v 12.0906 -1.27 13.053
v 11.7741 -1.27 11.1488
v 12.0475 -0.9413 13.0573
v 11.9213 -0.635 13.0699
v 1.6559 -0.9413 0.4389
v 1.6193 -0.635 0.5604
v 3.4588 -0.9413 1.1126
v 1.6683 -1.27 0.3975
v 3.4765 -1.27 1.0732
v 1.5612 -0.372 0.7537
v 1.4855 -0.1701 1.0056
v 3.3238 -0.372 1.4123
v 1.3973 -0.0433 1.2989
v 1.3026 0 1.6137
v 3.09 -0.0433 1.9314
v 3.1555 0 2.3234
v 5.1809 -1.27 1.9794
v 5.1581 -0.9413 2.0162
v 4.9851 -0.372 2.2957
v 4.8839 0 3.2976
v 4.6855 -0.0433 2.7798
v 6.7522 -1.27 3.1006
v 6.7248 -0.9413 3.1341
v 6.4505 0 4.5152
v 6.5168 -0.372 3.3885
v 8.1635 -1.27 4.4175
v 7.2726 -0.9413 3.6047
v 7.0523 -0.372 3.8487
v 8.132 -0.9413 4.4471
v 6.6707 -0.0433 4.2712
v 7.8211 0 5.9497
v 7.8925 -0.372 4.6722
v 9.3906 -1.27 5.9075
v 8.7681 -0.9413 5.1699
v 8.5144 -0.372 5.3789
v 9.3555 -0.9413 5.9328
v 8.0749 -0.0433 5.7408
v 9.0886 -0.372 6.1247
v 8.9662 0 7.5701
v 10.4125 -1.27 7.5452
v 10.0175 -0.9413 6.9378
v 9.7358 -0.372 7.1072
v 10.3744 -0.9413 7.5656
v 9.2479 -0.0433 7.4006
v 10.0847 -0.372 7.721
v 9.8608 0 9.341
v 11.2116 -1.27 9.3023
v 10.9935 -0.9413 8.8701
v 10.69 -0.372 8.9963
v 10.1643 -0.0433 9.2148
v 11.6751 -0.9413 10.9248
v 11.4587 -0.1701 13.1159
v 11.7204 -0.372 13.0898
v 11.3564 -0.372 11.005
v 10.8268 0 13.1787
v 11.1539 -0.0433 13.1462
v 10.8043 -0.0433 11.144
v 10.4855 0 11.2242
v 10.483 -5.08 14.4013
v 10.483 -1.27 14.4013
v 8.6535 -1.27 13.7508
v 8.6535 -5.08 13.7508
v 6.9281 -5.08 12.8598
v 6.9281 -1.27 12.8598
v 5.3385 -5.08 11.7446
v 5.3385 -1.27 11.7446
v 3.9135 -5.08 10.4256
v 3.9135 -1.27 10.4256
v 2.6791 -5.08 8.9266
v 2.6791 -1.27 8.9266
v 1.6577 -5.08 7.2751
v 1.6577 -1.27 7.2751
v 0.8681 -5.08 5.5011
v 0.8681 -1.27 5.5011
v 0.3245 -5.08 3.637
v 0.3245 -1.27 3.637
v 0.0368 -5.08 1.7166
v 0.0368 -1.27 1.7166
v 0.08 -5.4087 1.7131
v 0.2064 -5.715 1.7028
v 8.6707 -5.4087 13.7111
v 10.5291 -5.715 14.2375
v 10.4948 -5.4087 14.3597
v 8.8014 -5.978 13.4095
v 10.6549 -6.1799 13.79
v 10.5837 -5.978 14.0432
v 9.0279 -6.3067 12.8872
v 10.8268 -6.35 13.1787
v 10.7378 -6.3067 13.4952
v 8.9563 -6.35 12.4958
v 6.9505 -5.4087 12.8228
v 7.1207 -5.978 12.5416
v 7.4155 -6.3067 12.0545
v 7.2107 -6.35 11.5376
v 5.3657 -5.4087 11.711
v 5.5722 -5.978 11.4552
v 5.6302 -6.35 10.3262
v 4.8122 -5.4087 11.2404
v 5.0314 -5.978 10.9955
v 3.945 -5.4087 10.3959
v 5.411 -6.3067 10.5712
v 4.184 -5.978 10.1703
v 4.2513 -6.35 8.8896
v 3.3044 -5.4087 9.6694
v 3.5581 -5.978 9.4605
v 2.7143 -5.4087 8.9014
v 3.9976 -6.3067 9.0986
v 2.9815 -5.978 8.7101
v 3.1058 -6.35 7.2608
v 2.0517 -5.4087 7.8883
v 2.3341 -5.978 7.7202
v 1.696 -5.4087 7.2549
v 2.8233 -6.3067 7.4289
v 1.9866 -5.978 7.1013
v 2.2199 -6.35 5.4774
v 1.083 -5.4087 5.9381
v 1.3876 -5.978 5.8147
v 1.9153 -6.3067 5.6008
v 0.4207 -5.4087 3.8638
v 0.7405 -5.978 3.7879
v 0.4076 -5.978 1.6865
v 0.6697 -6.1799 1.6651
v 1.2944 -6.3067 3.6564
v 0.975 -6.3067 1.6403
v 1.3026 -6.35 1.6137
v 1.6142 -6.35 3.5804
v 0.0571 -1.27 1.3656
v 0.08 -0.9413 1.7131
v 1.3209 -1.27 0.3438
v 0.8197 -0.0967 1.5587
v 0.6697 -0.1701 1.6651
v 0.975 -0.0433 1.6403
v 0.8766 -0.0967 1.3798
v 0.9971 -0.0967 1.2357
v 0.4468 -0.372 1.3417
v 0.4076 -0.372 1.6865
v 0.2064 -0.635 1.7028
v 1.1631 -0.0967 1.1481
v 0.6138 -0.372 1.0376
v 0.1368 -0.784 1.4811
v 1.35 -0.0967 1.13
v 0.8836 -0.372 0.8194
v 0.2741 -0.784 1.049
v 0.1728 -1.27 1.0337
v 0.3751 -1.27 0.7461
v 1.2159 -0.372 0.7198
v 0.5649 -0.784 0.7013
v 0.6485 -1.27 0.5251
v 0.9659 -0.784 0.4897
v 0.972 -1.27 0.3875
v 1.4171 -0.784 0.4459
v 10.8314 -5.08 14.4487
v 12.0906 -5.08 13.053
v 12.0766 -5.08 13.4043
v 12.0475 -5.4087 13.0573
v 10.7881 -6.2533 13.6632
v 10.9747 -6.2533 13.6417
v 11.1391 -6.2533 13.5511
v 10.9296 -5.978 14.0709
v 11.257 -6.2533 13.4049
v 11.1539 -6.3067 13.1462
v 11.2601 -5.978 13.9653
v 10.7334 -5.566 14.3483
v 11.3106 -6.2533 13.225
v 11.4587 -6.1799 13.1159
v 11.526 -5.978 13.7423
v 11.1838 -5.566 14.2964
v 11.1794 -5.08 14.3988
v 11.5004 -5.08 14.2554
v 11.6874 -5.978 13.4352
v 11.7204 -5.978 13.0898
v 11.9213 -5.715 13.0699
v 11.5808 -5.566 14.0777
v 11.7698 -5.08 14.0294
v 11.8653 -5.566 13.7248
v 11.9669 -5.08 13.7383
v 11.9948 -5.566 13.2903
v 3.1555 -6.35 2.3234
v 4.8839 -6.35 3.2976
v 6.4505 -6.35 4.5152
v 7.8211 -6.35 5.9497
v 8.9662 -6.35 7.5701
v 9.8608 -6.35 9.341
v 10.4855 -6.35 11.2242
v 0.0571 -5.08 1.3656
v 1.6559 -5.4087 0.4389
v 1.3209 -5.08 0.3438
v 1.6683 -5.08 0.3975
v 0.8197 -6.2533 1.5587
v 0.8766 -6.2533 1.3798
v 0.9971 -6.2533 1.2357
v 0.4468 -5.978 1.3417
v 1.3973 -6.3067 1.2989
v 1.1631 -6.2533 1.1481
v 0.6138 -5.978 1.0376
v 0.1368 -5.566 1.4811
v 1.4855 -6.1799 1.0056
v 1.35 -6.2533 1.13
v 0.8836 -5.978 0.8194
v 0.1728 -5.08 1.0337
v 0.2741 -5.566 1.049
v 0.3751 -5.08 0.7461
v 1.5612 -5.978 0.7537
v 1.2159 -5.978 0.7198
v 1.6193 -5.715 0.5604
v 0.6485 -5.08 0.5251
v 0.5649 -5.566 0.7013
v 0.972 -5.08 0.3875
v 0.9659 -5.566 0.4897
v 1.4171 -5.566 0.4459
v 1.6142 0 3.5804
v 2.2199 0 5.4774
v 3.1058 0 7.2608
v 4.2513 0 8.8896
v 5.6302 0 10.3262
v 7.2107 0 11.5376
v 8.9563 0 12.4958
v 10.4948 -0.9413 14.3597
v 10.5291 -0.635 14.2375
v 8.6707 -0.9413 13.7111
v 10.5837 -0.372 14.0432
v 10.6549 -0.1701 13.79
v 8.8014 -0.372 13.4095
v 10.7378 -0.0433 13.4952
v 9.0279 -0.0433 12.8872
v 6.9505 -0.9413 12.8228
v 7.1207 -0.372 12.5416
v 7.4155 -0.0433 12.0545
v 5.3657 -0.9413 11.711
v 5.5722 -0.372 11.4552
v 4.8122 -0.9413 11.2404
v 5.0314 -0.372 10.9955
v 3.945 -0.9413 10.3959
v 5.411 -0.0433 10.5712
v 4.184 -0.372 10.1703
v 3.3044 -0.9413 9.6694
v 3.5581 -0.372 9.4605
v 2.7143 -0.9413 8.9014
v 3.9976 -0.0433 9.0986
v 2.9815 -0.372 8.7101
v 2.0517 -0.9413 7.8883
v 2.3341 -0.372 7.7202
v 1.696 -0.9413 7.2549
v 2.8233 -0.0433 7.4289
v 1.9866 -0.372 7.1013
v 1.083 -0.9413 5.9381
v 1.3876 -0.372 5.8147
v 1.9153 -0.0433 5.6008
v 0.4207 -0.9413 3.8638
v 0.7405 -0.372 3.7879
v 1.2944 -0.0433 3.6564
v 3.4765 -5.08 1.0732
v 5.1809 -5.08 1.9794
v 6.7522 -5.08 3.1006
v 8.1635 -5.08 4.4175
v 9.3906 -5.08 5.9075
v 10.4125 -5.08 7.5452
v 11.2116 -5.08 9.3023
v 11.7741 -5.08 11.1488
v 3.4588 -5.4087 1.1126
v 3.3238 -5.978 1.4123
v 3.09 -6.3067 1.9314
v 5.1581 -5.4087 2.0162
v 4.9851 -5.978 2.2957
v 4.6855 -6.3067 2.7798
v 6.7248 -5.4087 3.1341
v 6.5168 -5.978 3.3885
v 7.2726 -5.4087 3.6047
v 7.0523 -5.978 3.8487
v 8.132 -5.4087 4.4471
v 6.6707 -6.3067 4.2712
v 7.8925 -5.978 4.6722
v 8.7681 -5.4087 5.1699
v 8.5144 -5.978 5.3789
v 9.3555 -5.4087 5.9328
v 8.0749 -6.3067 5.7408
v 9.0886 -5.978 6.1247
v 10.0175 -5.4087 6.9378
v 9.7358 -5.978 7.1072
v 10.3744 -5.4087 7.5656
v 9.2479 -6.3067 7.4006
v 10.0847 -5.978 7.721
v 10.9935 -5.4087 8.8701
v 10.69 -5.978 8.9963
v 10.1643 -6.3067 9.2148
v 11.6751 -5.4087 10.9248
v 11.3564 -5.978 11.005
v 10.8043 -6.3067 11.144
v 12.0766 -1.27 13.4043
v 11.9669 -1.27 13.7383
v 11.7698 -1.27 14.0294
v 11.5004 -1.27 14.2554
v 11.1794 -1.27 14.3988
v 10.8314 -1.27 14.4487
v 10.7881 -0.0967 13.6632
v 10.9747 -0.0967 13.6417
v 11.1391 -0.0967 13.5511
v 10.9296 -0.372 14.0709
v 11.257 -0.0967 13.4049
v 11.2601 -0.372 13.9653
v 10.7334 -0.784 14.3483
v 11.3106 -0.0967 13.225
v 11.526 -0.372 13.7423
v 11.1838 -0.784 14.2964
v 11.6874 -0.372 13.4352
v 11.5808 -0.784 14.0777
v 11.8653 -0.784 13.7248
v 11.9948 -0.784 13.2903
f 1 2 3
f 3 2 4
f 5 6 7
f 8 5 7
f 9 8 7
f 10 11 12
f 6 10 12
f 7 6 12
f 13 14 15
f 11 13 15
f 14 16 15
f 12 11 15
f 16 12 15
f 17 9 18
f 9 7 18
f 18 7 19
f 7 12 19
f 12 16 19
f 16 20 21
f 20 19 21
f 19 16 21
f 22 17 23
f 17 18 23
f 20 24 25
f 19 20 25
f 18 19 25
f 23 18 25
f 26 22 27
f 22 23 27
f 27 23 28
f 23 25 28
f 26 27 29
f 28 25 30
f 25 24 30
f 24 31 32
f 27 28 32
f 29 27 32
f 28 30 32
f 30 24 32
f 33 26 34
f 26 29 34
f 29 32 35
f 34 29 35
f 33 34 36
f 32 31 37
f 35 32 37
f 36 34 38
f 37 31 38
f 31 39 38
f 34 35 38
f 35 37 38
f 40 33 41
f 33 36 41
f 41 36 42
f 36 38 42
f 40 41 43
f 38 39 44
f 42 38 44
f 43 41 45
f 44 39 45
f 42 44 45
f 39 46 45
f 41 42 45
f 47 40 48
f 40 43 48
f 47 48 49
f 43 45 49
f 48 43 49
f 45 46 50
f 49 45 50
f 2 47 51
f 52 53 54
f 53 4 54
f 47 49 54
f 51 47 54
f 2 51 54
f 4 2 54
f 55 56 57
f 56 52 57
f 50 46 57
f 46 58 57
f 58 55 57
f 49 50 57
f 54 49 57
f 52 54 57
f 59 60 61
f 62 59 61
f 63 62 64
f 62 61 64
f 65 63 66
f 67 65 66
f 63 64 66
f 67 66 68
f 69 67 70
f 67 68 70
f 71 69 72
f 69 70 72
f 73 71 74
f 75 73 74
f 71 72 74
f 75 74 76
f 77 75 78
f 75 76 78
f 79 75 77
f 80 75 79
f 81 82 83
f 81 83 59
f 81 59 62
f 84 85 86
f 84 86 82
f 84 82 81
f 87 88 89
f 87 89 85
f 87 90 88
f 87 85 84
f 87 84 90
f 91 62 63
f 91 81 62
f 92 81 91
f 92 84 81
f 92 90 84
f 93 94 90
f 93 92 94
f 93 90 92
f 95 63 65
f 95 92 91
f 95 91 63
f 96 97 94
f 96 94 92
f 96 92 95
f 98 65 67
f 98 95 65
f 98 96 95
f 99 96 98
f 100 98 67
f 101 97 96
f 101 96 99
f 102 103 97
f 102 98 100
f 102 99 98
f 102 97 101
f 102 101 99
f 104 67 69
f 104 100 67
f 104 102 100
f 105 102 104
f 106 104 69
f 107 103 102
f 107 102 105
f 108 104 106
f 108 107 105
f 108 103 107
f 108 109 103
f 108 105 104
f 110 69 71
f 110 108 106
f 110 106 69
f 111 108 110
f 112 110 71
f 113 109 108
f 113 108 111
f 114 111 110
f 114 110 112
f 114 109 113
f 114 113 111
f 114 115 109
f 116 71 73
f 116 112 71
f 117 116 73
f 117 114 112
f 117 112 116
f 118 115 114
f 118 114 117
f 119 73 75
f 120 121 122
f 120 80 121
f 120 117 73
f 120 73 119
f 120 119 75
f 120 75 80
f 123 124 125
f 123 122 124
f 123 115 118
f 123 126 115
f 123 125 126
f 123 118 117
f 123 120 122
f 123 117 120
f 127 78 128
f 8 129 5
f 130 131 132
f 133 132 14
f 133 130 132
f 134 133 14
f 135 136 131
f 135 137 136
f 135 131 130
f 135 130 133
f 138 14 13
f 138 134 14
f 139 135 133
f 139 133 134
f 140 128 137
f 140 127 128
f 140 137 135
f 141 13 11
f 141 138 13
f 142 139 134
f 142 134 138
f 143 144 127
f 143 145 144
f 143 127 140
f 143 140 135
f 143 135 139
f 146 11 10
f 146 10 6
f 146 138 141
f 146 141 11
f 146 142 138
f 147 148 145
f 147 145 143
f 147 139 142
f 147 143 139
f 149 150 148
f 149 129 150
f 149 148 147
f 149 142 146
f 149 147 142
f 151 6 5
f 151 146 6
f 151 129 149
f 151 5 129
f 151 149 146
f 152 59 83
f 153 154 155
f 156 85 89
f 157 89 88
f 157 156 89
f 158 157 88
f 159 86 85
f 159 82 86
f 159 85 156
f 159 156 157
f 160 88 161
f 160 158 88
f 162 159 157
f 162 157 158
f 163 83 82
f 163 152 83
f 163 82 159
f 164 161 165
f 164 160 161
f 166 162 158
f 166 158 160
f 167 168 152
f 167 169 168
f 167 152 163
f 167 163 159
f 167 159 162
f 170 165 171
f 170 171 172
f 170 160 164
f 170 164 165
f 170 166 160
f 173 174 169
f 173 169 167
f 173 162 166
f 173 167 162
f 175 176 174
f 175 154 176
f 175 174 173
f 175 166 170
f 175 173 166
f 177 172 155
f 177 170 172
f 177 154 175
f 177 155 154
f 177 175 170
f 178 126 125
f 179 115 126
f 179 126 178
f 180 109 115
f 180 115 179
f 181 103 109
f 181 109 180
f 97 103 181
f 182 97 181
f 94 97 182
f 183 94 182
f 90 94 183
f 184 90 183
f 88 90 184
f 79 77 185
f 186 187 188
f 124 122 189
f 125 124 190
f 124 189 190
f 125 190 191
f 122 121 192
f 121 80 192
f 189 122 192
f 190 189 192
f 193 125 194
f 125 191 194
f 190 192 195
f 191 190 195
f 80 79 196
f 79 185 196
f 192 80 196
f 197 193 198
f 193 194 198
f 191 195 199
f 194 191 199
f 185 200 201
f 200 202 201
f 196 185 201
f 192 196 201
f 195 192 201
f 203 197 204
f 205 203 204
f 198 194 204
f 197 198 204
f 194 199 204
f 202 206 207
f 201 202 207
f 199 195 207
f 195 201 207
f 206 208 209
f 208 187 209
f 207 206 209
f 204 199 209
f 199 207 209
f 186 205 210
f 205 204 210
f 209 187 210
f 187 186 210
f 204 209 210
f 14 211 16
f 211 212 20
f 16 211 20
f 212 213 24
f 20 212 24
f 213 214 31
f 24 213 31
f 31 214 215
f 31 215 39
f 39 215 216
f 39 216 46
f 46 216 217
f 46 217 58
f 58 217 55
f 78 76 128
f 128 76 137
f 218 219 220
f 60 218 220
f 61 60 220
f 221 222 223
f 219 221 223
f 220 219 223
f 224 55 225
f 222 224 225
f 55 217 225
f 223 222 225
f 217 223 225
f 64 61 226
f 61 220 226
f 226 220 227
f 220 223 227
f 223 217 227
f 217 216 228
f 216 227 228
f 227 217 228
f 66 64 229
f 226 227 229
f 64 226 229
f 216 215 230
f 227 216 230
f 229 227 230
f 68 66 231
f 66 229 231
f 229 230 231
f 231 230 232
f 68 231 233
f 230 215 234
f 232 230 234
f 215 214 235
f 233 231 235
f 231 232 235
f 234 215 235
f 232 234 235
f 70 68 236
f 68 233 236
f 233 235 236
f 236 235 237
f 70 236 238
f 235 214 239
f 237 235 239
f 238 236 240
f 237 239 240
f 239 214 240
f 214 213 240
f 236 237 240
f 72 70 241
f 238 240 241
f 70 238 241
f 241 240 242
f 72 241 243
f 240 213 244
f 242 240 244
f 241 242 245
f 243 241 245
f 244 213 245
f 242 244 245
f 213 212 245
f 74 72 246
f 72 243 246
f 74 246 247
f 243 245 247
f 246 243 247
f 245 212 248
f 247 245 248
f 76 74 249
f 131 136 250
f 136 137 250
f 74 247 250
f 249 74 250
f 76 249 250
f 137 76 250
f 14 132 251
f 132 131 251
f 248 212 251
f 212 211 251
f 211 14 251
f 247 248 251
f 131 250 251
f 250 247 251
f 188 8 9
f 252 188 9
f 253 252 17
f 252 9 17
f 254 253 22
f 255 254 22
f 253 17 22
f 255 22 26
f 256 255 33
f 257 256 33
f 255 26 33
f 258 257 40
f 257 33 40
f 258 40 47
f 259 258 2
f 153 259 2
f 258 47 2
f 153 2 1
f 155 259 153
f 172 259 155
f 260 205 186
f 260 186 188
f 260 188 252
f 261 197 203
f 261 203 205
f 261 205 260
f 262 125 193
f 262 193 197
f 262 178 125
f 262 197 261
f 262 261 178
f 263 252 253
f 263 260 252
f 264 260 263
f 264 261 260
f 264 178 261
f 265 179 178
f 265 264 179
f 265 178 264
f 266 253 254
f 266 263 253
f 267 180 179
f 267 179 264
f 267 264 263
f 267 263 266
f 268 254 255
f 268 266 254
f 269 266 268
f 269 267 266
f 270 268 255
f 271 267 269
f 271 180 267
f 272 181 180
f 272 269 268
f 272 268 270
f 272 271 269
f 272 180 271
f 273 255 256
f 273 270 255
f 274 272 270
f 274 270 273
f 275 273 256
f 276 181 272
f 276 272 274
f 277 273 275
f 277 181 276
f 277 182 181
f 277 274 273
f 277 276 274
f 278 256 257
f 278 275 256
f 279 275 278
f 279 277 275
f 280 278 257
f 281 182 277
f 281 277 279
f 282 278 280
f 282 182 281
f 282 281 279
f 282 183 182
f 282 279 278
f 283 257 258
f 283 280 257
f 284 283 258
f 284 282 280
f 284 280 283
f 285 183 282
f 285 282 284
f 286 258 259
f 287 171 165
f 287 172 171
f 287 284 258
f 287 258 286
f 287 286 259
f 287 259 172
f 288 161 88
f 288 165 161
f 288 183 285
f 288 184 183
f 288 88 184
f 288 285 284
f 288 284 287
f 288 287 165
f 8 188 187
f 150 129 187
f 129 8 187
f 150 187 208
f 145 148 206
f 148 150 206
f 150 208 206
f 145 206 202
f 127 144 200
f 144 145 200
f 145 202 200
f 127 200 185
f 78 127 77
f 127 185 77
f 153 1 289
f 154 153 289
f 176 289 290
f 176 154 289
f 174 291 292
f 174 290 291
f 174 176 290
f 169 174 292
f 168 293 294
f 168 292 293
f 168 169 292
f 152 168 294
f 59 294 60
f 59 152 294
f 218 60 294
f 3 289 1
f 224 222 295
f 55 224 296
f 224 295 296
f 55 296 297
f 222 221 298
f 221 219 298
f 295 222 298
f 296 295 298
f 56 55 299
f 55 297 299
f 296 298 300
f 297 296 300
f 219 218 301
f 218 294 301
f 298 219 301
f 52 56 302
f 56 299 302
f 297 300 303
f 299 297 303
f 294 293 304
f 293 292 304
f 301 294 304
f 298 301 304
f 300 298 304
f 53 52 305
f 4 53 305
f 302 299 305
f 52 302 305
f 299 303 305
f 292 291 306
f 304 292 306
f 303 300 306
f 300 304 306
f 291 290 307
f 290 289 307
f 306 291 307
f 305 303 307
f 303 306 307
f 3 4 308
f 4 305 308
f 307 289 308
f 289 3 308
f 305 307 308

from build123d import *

# Parameters (mm, degrees)
F1_DEPTH = 6.35
F3_R     = 1.27


# Not quite as in the source:
# - a feature of the source that left no trace in its solid (it failed there, or was rolled back) is left out


with BuildPart() as f1:
    # F0 (on Front) → F1 (new body)
    with BuildSketch(Plane.XZ):
        with BuildLine():
            ThreePointArc((0, 0), (8.8014992753, 5.1423850964), (12.1607482433, 14.766623266))
            ThreePointArc((12.1607482433, 14.766623266), (3.270966354, 9.6969414968), (0, 0))
        make_face()
    extrude(amount=F1_DEPTH)

    # F3
    f3_edges = [f1.edges().sort_by_distance(p)[0] for p in [
        (3.270966, 0, 9.696941),
        (8.801499, 0, 5.142385),
        (12.160748, -3.175, 14.766623),
        (0, -3.175, 0),
        (3.270966, -6.35, 9.696941),
        (8.801499, -6.35, 5.142385),
    ]]
    fillet(f3_edges, radius=F3_R)


solid = f1.part
